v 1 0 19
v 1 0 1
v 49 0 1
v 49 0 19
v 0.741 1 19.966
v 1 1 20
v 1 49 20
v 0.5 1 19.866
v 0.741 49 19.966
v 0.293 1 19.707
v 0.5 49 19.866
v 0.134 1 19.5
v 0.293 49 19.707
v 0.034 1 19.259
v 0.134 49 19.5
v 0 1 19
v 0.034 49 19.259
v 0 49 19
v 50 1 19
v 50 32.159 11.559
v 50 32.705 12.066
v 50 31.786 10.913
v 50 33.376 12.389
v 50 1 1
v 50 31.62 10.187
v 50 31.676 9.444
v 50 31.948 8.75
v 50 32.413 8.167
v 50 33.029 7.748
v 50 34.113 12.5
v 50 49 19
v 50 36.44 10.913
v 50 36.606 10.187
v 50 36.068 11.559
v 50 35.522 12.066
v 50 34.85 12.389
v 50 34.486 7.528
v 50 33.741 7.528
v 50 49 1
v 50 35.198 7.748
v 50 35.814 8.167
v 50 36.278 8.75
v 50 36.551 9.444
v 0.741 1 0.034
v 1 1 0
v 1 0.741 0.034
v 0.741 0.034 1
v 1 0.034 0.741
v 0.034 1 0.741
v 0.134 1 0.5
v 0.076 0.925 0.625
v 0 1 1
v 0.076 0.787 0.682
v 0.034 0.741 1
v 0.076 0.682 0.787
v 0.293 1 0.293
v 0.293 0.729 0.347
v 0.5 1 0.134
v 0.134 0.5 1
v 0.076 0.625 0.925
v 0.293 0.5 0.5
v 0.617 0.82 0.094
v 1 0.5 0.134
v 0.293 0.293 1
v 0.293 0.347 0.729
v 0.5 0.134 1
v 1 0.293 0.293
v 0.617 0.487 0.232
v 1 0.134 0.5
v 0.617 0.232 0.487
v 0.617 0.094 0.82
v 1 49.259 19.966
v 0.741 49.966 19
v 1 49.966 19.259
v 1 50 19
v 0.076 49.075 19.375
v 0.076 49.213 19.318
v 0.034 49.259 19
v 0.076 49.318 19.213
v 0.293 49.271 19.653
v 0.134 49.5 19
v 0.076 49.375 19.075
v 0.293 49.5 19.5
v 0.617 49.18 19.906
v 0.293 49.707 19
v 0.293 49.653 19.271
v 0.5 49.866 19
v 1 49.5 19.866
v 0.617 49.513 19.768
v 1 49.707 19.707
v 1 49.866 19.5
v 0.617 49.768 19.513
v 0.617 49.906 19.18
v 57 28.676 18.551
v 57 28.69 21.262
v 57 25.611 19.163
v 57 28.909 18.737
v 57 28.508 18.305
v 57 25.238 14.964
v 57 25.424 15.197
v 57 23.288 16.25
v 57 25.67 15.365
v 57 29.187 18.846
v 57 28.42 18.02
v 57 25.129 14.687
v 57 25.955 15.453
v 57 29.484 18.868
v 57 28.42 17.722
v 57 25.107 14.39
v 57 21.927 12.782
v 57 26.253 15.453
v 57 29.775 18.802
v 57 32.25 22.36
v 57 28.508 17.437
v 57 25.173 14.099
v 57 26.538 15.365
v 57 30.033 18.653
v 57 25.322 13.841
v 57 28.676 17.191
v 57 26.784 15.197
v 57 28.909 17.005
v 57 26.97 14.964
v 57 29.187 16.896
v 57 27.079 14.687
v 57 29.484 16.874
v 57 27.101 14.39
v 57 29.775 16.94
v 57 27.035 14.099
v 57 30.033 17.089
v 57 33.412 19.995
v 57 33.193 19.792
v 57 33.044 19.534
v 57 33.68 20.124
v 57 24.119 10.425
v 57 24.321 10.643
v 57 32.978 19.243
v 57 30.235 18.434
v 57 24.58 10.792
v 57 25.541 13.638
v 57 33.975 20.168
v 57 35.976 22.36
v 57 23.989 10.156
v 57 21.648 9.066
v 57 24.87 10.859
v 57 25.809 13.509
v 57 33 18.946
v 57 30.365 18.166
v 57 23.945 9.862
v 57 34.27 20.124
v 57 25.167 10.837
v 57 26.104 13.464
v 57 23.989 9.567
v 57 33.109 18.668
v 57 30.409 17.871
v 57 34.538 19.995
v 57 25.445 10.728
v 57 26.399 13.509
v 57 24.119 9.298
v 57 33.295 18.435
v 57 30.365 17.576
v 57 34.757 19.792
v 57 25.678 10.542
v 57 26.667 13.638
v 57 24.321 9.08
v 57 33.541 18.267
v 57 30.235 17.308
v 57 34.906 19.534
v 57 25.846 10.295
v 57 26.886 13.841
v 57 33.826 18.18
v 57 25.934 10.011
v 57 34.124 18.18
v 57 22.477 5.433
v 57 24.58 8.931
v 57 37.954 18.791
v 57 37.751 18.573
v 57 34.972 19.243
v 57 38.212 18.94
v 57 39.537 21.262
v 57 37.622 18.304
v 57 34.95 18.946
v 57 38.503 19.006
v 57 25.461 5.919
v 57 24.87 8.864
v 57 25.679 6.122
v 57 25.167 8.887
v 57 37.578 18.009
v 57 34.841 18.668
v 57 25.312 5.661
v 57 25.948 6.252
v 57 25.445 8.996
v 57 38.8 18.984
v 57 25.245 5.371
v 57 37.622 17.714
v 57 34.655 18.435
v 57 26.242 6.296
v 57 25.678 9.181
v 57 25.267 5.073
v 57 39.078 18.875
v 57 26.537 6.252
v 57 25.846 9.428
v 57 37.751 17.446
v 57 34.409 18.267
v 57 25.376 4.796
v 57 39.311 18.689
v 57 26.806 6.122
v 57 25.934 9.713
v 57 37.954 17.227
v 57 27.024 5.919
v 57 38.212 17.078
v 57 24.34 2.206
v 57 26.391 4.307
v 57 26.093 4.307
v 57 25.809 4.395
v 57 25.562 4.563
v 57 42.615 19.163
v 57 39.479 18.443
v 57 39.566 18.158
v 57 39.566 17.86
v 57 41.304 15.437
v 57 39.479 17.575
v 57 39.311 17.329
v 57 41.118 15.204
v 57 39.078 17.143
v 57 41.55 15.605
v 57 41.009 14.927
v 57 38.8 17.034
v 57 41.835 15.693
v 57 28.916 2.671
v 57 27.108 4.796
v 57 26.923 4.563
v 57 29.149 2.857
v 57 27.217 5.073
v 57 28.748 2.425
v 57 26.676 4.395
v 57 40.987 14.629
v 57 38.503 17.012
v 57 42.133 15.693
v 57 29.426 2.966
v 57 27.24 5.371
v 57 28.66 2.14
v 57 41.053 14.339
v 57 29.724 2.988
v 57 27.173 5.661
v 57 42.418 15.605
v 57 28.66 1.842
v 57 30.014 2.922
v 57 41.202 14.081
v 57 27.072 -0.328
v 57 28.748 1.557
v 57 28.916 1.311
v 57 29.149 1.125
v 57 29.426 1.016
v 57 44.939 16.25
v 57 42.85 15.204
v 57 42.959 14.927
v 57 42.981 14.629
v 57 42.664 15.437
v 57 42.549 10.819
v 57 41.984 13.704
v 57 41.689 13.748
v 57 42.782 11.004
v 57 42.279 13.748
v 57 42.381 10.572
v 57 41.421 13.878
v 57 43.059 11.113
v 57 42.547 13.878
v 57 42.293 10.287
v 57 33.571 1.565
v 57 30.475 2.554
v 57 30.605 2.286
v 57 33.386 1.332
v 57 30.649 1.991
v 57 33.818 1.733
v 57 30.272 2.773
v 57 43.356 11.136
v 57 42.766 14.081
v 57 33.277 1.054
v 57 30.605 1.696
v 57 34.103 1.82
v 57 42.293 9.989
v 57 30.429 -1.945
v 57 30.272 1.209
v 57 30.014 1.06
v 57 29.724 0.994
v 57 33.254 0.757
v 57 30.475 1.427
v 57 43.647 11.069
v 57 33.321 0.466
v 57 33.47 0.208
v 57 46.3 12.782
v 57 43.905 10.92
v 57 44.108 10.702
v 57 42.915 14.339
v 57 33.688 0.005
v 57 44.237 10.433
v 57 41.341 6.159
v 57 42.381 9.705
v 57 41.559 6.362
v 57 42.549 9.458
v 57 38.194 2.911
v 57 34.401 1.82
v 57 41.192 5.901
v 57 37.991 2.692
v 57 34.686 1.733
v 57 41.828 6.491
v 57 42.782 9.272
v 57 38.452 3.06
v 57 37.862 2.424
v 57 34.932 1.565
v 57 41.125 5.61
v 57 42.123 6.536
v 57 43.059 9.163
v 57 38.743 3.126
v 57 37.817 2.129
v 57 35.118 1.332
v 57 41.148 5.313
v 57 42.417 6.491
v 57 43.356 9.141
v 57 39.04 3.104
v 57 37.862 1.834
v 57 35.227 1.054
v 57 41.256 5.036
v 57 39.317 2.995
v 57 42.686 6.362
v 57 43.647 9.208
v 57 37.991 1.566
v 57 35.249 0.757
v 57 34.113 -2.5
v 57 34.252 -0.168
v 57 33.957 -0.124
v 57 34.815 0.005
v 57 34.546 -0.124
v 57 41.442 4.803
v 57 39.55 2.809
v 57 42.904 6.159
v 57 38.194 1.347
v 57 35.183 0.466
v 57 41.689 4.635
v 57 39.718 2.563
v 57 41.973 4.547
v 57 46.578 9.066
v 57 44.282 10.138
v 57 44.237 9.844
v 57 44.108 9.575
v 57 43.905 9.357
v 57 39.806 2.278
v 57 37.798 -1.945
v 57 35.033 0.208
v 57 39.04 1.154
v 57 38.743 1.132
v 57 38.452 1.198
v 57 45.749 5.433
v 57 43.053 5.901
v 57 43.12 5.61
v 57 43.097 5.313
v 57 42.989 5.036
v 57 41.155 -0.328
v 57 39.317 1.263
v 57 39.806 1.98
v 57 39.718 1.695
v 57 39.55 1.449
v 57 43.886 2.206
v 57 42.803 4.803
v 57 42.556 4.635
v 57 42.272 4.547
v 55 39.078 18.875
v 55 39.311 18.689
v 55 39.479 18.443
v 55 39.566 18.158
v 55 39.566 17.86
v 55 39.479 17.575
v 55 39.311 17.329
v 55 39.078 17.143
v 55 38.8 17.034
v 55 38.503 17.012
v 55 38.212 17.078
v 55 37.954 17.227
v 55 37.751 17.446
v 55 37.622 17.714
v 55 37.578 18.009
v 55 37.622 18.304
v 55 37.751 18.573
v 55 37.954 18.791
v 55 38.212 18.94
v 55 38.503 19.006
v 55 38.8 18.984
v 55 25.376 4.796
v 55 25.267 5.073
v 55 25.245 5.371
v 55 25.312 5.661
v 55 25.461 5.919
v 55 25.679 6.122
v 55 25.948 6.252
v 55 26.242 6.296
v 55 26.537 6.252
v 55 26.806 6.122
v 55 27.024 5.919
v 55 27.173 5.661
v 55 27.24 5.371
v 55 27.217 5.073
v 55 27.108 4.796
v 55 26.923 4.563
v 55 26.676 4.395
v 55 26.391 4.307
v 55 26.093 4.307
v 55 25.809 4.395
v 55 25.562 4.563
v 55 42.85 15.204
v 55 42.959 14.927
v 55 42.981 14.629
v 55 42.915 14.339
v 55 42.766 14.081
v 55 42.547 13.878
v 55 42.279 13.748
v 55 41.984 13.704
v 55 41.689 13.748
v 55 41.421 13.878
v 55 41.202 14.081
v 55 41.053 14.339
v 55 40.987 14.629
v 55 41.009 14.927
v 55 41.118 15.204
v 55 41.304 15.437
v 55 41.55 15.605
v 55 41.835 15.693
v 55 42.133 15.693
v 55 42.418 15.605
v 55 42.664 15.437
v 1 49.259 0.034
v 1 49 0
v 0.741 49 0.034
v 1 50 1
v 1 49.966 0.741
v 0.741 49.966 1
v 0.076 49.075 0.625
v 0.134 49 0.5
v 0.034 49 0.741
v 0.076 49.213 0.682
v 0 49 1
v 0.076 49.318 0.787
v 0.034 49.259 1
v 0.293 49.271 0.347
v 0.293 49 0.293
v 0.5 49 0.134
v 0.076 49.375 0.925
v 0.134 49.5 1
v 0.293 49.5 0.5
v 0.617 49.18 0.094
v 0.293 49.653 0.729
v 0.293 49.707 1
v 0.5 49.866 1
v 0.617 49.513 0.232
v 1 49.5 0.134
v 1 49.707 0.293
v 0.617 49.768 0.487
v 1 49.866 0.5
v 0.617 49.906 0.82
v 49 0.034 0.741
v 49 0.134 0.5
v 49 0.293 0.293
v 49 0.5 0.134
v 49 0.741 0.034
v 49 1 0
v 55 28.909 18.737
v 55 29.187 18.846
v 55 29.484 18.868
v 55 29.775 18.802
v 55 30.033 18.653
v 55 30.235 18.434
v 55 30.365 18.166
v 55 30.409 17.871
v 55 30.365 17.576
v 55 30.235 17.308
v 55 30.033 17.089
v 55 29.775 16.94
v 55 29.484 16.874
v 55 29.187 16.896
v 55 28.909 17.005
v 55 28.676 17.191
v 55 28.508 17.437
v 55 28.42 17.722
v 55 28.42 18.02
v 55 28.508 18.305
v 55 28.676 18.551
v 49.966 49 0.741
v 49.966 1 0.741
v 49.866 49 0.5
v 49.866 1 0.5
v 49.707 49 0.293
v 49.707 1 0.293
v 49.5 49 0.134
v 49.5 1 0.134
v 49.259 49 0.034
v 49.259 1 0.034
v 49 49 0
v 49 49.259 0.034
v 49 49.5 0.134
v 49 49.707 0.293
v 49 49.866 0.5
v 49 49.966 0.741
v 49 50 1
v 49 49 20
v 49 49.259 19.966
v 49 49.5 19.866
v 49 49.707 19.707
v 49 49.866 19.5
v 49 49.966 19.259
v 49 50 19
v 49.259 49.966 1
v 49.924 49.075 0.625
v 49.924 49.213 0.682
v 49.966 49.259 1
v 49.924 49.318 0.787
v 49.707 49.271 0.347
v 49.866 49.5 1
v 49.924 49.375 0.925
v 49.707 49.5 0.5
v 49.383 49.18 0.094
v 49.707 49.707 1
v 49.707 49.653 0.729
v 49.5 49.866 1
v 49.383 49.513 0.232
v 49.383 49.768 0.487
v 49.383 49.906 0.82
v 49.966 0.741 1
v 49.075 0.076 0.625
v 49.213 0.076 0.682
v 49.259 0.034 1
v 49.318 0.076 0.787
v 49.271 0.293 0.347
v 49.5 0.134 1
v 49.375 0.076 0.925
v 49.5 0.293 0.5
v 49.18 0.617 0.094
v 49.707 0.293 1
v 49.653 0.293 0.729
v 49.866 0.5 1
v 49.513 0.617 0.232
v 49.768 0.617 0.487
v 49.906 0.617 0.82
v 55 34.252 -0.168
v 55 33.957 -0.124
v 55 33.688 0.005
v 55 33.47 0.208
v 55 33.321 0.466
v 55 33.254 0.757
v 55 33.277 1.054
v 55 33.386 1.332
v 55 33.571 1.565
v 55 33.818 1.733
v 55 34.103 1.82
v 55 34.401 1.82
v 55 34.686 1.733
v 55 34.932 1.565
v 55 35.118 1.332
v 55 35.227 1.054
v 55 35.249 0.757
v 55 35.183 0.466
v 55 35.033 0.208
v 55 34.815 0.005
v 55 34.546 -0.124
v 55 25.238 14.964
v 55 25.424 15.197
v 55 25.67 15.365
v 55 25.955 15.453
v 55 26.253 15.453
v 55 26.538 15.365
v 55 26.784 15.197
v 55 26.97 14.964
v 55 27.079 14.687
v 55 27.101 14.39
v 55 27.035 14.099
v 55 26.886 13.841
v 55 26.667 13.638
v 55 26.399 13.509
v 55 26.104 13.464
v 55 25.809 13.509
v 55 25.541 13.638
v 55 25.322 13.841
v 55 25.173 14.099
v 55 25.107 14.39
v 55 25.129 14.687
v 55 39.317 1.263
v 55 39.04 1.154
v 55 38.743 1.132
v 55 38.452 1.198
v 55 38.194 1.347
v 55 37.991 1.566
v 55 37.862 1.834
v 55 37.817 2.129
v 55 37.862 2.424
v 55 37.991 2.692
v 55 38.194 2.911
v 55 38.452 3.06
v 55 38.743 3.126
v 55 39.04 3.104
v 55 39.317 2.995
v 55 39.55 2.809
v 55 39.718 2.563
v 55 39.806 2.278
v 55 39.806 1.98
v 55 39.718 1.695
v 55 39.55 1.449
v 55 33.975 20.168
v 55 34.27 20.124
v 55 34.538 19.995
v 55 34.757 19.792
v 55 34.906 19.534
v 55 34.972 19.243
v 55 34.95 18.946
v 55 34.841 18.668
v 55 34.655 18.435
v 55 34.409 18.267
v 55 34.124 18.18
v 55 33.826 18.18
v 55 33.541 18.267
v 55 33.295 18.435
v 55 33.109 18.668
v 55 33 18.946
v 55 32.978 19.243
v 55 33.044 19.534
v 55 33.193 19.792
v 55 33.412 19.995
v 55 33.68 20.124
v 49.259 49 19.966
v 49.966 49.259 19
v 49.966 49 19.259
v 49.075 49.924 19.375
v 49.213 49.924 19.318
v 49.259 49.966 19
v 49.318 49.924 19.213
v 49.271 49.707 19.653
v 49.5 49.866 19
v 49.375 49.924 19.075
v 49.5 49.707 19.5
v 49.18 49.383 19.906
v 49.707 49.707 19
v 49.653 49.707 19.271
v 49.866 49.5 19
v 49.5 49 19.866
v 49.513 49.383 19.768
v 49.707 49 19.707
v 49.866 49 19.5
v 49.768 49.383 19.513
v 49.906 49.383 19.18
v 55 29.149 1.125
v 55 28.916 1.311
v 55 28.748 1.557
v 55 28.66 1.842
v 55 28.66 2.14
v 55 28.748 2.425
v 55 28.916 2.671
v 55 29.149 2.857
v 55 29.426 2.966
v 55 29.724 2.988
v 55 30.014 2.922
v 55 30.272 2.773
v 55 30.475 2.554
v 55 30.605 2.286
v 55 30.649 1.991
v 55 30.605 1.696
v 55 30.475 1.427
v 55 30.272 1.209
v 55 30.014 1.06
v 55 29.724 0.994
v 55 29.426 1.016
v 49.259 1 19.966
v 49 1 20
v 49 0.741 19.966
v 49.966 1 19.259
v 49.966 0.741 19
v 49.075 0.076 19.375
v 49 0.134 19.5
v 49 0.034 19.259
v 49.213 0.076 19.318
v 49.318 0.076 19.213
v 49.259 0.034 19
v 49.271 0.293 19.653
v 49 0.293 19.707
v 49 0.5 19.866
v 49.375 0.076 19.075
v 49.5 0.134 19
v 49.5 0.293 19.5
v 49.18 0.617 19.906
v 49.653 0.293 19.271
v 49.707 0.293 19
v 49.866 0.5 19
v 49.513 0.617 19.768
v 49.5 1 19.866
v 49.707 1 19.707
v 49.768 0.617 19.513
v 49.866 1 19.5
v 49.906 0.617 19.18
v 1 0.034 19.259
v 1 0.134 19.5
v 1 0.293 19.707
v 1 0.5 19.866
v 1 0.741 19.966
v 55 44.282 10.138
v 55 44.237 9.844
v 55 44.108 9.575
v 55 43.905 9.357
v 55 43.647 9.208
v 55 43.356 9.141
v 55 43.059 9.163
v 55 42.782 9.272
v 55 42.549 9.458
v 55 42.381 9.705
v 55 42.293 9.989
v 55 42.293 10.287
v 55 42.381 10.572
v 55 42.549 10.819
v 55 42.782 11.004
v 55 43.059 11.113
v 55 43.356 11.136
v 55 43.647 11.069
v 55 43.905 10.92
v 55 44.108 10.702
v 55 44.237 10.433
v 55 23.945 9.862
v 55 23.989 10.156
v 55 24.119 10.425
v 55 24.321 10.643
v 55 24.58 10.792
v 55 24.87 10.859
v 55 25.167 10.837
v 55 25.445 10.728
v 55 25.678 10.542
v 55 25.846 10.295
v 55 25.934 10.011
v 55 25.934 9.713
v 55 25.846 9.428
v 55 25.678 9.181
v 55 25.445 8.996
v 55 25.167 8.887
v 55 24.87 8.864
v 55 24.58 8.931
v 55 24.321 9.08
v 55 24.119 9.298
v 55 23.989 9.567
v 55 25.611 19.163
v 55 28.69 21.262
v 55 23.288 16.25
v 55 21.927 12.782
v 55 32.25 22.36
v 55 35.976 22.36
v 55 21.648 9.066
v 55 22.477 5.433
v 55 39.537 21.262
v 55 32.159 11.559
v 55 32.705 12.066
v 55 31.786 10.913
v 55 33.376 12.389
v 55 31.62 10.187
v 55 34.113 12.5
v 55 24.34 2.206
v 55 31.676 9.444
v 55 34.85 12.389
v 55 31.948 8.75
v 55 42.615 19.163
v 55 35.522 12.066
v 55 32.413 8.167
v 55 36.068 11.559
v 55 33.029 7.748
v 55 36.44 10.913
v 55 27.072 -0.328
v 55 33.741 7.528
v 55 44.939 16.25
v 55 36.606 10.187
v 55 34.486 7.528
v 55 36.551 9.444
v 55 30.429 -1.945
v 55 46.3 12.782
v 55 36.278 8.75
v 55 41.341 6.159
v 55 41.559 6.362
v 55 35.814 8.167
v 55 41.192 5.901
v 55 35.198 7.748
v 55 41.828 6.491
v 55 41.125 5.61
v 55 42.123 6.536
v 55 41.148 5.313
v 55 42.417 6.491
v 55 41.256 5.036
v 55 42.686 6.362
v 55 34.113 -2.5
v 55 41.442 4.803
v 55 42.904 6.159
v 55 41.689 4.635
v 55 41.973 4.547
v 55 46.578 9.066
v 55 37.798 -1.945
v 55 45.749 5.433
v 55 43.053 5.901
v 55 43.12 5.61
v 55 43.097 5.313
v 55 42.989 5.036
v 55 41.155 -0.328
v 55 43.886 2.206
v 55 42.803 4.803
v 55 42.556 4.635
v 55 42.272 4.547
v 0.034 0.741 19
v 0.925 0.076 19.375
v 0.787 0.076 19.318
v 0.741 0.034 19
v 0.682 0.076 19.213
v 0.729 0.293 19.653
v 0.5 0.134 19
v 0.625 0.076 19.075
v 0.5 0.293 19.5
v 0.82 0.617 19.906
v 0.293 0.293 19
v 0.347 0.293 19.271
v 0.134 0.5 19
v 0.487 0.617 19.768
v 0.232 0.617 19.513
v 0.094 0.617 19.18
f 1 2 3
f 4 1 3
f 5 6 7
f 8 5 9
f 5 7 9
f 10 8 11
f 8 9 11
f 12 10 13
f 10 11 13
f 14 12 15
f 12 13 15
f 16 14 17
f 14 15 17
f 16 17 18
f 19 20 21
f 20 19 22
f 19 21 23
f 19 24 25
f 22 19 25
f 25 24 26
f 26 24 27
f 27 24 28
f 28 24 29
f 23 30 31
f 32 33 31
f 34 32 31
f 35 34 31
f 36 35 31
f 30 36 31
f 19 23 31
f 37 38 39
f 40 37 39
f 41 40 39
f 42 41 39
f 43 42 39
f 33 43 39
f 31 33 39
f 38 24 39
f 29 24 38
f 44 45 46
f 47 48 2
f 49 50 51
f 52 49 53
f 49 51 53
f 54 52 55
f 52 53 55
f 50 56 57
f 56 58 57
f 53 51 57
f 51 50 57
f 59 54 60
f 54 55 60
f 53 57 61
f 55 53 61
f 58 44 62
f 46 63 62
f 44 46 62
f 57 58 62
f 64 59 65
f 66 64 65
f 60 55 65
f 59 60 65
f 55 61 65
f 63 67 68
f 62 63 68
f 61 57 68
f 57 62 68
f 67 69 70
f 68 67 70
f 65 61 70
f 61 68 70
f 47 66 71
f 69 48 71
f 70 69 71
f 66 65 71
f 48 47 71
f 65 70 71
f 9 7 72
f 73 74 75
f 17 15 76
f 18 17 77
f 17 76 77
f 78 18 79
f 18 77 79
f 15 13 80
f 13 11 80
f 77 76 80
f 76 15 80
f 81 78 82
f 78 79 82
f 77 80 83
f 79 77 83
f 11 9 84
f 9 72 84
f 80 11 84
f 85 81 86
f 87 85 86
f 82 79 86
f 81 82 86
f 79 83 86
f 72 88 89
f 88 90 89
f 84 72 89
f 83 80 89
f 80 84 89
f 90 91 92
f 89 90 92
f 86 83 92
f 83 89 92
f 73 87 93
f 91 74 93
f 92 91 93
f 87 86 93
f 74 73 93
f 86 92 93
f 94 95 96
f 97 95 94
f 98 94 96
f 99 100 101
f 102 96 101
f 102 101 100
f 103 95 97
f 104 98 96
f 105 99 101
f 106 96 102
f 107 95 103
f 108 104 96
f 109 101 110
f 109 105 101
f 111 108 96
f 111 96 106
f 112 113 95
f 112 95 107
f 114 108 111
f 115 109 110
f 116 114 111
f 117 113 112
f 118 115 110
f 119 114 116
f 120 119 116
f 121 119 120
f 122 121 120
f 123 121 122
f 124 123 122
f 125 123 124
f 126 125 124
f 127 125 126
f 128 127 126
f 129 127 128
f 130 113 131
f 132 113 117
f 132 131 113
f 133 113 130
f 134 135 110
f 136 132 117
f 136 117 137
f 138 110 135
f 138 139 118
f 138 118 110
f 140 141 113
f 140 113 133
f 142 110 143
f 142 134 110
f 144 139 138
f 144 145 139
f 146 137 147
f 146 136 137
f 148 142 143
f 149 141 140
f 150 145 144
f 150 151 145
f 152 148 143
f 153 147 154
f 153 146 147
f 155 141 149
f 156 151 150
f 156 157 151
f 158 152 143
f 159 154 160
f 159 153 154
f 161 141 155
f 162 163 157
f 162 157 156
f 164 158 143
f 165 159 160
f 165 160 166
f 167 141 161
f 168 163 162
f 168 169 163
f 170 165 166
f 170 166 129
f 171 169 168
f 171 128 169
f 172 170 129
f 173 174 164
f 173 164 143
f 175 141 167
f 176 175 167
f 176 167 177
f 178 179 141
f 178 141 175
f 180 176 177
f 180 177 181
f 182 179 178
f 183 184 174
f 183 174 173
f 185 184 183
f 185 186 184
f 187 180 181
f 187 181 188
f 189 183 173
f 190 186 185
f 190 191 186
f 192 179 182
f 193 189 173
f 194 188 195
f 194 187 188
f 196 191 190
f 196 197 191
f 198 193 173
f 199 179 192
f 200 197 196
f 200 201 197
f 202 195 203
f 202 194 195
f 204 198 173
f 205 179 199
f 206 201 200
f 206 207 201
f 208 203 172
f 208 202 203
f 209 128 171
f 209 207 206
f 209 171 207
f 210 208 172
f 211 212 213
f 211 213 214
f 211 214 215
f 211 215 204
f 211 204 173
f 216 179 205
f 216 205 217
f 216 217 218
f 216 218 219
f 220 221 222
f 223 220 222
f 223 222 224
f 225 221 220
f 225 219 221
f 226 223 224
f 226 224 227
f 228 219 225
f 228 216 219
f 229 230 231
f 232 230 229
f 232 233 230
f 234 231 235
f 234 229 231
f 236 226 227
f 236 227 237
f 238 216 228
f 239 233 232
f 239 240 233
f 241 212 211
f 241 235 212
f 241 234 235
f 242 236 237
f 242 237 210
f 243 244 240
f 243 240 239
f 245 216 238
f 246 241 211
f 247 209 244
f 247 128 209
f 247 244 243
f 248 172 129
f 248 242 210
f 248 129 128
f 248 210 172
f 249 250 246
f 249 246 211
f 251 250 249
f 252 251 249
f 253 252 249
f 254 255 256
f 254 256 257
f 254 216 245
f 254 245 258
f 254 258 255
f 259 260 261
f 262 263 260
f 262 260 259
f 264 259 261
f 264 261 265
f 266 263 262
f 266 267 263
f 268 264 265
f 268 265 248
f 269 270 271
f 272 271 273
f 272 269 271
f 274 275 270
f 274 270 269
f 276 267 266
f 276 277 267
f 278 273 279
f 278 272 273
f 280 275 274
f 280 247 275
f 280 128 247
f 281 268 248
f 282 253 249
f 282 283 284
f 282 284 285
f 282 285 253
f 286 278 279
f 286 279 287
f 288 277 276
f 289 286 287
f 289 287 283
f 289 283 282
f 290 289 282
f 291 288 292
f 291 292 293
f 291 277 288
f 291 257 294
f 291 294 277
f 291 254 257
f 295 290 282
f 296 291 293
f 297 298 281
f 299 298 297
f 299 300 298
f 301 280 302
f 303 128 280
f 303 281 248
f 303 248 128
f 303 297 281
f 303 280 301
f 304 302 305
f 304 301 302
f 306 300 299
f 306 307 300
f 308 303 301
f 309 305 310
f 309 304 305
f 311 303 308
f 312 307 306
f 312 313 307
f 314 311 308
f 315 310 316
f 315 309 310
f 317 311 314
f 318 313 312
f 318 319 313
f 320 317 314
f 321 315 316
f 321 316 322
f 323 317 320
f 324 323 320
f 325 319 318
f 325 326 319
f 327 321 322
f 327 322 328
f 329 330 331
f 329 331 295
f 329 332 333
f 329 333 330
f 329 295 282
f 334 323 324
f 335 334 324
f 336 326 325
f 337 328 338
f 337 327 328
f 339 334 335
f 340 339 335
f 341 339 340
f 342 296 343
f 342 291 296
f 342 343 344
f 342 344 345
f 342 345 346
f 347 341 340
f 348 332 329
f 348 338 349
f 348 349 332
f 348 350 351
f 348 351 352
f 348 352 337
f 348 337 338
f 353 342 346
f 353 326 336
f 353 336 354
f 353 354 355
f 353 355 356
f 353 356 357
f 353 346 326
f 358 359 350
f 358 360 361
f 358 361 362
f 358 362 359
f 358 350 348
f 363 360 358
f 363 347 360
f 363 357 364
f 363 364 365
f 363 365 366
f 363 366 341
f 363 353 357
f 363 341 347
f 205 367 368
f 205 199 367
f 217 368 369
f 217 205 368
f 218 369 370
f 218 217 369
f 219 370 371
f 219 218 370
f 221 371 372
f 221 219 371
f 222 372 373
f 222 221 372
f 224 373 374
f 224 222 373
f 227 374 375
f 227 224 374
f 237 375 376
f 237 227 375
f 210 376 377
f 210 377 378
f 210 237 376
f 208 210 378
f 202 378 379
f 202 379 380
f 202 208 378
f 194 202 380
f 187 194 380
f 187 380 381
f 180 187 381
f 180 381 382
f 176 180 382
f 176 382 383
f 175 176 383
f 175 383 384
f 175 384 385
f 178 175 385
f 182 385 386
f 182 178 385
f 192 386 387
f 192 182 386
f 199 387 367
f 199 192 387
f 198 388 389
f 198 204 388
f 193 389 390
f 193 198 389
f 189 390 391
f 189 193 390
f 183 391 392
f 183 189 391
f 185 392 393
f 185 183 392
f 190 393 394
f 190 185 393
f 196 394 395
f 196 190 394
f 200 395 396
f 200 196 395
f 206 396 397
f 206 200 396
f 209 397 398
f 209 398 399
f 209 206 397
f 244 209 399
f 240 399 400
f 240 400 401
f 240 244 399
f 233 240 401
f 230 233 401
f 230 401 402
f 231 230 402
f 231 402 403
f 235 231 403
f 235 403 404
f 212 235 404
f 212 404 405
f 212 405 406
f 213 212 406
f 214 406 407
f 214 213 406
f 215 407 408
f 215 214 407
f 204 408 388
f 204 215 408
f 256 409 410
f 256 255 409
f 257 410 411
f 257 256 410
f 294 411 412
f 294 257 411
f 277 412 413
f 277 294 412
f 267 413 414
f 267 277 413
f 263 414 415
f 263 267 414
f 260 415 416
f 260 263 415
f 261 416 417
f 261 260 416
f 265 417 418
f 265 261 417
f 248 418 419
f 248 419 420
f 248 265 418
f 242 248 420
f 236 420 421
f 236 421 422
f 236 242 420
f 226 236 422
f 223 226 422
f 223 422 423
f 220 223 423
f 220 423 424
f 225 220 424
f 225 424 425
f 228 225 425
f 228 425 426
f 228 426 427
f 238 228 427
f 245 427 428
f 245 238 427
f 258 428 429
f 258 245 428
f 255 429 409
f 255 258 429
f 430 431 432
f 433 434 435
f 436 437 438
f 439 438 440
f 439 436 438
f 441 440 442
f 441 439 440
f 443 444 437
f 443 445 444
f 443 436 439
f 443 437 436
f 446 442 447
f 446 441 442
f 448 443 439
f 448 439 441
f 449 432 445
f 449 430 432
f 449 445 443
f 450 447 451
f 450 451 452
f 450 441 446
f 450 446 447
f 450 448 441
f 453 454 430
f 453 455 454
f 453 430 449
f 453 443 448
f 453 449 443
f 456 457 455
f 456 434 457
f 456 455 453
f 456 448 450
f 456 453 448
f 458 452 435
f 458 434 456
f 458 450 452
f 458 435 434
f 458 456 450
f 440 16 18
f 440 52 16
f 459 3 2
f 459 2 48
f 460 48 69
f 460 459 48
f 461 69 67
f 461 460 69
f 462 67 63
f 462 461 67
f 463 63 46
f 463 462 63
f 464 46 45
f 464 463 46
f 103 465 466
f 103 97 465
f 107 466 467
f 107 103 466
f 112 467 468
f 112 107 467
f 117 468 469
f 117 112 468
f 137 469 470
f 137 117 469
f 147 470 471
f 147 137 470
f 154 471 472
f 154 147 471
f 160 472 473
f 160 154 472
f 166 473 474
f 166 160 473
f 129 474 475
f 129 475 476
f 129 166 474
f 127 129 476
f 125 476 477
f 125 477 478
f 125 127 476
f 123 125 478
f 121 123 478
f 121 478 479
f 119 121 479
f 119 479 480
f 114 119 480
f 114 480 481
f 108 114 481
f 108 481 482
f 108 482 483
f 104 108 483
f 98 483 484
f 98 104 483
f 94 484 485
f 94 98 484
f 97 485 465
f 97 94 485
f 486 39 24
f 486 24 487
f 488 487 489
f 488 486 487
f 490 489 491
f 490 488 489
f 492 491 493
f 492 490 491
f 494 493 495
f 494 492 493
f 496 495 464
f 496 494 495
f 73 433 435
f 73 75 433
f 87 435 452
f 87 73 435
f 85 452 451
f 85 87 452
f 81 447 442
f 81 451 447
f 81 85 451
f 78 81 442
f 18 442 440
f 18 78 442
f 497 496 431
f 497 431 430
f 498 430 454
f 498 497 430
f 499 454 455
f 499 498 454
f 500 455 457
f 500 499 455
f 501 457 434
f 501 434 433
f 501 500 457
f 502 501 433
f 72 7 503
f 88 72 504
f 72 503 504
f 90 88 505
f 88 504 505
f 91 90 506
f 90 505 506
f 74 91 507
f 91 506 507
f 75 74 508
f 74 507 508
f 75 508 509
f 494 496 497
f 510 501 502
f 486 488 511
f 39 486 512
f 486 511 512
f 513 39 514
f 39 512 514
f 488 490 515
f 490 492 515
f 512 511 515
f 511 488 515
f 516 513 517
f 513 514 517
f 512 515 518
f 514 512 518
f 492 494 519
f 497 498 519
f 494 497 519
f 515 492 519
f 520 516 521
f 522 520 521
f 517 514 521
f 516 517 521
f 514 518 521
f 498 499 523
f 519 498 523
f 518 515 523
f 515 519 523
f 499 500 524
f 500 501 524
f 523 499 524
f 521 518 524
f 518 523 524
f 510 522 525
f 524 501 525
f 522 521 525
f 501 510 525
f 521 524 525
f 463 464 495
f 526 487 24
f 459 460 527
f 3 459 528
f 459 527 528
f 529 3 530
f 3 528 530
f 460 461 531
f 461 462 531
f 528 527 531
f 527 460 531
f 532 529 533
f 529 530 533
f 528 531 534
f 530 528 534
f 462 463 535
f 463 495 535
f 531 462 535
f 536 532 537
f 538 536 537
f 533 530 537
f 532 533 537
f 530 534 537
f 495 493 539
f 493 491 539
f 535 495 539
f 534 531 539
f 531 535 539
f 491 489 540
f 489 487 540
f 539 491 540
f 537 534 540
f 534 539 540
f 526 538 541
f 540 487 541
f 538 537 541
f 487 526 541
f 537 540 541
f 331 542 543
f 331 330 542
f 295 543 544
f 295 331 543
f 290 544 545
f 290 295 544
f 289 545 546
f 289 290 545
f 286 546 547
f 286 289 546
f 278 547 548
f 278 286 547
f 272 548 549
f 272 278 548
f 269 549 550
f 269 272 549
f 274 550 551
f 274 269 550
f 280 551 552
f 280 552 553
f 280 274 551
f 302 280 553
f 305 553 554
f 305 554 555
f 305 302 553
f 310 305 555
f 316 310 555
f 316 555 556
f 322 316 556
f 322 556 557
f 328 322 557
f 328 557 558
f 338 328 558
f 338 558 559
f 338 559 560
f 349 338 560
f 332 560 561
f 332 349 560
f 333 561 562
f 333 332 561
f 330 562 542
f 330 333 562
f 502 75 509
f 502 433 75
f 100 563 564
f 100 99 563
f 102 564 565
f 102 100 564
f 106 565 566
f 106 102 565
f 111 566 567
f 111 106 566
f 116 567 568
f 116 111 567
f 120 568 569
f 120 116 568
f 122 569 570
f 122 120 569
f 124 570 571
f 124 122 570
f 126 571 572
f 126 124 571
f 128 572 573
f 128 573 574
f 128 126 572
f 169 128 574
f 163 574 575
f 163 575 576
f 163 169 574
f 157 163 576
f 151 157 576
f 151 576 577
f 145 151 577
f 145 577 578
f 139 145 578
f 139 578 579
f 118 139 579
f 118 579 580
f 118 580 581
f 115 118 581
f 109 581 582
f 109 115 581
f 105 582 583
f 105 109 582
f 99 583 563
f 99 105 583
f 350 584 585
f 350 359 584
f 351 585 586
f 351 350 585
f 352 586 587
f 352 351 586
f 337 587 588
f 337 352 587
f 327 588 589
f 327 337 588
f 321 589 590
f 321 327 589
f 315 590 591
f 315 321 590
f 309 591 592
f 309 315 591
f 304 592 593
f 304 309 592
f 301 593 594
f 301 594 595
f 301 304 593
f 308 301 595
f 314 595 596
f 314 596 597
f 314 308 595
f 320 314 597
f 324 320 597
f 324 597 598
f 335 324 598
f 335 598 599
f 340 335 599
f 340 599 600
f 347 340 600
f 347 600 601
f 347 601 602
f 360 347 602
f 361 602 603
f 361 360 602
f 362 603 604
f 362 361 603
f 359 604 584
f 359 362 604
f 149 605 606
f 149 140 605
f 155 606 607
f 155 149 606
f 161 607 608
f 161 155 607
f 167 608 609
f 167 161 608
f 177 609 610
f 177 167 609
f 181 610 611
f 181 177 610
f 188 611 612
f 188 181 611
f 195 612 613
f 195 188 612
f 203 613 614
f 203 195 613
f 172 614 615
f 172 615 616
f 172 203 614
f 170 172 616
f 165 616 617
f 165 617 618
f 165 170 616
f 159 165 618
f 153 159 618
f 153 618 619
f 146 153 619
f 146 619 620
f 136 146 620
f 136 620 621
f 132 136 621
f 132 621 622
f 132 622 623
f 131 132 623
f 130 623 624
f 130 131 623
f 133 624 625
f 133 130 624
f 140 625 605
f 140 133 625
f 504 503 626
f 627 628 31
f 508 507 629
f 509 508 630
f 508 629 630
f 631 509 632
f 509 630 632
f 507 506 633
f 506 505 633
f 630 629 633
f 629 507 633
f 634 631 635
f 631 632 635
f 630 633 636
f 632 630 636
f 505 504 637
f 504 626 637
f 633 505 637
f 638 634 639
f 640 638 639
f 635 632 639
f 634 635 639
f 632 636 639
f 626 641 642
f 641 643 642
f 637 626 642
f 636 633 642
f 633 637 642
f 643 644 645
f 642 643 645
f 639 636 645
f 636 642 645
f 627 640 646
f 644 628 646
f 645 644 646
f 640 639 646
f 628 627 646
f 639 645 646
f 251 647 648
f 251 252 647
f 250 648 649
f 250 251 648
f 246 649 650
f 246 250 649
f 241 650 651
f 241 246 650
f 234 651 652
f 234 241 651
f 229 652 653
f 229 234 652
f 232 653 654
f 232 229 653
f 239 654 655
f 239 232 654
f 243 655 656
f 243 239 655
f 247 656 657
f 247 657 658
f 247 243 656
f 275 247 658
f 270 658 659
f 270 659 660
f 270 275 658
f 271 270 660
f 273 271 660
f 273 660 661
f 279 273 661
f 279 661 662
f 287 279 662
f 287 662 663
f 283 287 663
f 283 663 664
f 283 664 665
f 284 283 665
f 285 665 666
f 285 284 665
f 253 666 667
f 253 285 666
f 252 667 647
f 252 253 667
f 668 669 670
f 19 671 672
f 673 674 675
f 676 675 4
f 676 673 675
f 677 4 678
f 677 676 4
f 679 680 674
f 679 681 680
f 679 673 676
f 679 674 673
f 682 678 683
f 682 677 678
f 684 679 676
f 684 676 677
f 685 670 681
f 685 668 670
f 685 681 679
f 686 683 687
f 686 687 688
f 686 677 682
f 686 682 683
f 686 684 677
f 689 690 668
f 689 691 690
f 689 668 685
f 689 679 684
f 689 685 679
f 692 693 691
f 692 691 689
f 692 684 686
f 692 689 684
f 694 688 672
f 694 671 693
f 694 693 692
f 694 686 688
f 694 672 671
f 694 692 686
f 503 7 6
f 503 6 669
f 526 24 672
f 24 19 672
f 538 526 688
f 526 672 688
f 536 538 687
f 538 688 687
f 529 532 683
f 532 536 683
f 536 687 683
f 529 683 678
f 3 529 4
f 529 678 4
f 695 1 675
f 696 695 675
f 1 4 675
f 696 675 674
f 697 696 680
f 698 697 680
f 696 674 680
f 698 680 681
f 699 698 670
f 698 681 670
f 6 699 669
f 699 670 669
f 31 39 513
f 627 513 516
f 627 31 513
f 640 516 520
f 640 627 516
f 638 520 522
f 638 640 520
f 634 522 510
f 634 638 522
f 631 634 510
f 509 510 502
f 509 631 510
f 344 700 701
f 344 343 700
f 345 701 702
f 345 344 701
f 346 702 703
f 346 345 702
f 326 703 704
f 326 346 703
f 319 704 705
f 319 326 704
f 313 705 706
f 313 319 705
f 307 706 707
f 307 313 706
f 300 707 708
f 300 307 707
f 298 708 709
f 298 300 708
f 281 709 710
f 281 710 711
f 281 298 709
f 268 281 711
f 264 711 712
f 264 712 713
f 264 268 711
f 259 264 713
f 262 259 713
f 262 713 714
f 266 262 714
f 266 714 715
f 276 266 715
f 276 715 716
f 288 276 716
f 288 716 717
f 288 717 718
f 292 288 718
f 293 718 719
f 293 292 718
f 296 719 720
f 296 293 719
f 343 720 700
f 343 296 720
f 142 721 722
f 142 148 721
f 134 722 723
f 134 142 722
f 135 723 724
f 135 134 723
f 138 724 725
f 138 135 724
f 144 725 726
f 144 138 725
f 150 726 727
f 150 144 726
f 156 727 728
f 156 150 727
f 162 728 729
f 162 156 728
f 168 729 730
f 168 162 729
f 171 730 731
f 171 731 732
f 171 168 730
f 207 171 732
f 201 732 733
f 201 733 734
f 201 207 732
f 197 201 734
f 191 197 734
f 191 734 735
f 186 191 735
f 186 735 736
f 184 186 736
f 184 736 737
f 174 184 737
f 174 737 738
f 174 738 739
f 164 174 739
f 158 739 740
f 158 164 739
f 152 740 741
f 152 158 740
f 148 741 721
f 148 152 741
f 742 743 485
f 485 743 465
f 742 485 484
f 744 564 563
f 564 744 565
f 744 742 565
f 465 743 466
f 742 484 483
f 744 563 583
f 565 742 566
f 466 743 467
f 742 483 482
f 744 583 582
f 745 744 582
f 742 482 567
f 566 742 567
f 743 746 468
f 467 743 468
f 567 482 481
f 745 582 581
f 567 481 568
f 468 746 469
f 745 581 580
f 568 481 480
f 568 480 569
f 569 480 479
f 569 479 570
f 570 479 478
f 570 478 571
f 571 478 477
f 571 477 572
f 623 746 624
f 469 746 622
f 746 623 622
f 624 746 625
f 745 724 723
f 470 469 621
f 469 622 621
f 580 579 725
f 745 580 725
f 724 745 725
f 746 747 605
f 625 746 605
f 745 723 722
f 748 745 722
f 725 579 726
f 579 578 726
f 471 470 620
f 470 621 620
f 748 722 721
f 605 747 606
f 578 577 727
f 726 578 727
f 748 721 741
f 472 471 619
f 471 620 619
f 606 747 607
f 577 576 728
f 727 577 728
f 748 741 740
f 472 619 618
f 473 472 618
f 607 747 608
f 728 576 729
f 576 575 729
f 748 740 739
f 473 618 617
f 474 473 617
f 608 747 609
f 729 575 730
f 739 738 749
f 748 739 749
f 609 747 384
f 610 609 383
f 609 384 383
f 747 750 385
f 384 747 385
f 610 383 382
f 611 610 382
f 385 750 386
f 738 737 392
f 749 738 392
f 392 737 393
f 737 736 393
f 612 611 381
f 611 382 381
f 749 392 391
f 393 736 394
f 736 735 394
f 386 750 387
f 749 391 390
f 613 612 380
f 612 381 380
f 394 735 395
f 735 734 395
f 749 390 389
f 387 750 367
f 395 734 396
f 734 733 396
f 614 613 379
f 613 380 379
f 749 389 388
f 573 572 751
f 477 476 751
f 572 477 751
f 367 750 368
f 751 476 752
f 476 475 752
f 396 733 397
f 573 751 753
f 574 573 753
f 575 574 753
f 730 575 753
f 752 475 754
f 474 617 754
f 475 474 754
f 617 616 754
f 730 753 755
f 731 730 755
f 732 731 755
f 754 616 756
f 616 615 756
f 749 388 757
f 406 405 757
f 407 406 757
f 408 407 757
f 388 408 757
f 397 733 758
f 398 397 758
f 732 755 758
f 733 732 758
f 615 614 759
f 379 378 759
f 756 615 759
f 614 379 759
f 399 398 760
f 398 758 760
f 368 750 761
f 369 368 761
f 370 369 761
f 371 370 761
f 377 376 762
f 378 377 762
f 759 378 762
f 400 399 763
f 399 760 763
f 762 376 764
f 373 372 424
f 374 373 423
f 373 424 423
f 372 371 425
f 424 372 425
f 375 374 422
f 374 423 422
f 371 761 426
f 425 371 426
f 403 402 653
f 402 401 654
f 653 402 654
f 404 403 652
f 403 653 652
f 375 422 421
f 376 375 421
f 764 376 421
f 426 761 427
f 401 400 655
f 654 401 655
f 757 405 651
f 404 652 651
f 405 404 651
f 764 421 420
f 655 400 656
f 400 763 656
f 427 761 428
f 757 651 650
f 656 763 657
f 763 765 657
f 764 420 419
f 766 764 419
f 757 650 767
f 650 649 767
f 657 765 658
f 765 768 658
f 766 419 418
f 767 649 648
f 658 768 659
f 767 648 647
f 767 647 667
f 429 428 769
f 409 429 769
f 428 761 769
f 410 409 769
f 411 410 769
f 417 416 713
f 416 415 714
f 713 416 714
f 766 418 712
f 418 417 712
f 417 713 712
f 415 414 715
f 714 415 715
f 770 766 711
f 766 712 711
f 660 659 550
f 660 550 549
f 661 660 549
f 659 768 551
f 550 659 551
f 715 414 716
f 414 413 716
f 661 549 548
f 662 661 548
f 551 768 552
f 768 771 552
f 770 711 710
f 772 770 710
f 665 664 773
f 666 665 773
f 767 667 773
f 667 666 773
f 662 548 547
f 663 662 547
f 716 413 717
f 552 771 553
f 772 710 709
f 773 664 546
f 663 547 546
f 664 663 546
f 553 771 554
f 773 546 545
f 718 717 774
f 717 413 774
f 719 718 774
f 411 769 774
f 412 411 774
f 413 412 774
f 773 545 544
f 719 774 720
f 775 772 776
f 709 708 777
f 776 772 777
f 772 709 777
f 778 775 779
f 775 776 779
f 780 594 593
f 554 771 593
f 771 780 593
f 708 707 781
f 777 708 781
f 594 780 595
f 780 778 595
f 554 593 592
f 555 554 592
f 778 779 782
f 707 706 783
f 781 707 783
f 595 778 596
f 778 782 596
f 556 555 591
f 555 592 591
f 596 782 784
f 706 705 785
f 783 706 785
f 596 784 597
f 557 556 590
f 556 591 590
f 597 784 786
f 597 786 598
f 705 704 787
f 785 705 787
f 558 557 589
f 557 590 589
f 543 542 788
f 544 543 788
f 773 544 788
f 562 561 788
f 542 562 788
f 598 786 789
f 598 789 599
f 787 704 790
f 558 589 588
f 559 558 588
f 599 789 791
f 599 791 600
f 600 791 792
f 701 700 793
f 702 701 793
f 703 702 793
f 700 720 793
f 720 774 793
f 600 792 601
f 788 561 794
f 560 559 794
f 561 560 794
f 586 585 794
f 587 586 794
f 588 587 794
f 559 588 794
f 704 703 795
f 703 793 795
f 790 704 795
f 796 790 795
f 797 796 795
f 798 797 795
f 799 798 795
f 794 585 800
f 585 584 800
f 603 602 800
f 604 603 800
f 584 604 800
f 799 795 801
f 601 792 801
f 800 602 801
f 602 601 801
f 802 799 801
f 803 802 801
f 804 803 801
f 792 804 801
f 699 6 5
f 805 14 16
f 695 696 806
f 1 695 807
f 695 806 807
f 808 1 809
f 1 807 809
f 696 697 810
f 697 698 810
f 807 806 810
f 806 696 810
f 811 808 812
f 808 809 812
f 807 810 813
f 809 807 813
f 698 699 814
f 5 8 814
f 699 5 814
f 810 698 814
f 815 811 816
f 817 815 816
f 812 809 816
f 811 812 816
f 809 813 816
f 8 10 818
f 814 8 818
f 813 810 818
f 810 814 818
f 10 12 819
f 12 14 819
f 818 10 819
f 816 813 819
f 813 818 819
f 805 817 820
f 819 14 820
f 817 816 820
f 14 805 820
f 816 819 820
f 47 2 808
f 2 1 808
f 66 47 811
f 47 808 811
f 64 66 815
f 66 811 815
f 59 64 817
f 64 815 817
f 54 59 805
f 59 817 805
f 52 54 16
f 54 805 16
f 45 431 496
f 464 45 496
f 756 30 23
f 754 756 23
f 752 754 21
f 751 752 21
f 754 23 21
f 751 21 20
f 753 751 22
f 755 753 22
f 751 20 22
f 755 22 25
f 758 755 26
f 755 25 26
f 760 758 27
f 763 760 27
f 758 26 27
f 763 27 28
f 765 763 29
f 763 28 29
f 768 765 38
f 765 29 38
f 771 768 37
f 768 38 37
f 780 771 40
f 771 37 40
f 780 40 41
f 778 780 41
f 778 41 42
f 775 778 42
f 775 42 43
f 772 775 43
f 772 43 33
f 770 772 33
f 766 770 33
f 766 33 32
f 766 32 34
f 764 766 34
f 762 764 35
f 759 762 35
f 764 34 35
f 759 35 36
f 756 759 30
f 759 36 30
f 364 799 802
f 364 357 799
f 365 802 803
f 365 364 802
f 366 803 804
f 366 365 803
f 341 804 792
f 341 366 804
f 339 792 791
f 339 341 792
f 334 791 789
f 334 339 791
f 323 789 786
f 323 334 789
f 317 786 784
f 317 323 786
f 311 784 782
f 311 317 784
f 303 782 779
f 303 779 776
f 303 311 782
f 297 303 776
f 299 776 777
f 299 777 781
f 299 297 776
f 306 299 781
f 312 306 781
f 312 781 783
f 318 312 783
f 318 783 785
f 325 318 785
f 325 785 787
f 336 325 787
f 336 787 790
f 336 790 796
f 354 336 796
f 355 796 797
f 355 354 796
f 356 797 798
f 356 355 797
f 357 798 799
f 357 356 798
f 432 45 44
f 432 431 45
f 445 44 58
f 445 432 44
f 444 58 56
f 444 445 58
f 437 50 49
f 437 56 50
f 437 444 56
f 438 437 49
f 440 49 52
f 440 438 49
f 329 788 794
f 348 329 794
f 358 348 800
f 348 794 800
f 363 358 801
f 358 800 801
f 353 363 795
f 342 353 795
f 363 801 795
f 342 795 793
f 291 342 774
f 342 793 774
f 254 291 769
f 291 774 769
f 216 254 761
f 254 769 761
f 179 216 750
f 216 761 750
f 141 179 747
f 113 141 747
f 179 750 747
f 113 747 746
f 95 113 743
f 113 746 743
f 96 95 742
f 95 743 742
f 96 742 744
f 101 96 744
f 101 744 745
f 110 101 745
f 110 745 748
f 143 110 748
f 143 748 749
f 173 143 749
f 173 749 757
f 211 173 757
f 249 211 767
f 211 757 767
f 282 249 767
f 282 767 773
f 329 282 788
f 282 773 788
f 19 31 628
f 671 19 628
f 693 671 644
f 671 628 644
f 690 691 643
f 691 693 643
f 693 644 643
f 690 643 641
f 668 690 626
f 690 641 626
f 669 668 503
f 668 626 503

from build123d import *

# Parameters (mm, degrees)
SKETCH1_W           = 50
SKETCH1_H           = 50
BOSS_EXTRUDE1_DEPTH = 20
SKETCH2_R           = 2.5
BOSS_EXTRUDE2_DEPTH = 5
SKETCH3_R           = 12.5
BOSS_EXTRUDE3_DEPTH = 2
FILLET1_R           = 1
CIRPATTERN1_COUNT   = 12


with BuildPart() as part:
    # Sketch1 → Boss-Extrude1 (new body)
    with BuildSketch(Plane.XY):
        with Locations((25, 25)):
            Rectangle(SKETCH1_W, SKETCH1_H)
    extrude(amount=BOSS_EXTRUDE1_DEPTH)

    # Sketch2 → Boss-Extrude2 (add)
    with BuildSketch(Plane(origin=(50, 0, 0), x_dir=(0, 0, -1), z_dir=(1, 0, 0))):
        with Locations(Location((-10, 34.113262312, 0), (0, 0, 180))):
            Circle(SKETCH2_R)
    extrude(amount=BOSS_EXTRUDE2_DEPTH)

    # Sketch3 → Boss-Extrude3 (add)
    with BuildSketch(Plane(origin=(55, 0, 0), x_dir=(0, 0, -1), z_dir=(1, 0, 0))):
        with Locations((-10, 34.113262312)):
            Circle(SKETCH3_R)
    extrude(amount=BOSS_EXTRUDE3_DEPTH)

    # Fillet1
    fillet1_edges = [part.edges().sort_by_distance(p)[0] for p in [
        (50, 25, 20),
        (25, 50, 20),
        (0, 25, 20),
        (25, 50, 0),
        (50, 25, 0),
        (25, 0, 0),
        (0, 25, 0),
        (25, 0, 20),
        (0, 50, 10),
        (50, 50, 10),
        (50, 0, 10),
        (0, 0, 10),
    ]]
    fillet(fillet1_edges, radius=FILLET1_R)

    # Sketch4 → Ø2.0mm Dowel Hole1 (revolve, cut)
    with BuildSketch(Plane(origin=(57, 34.25166224, 0.83161613), x_dir=(0, 0, -1), z_dir=(0, 1, 0))):
        Polygon((0, 0), (0, 2.600860619), (1, 2), (1, 0), align=None)
    f_2_0mm_dowel_hole1 = revolve(axis=Axis((63.35, 34.25166224, 0.83161613), (-1, 0, 0)), mode=Mode.SUBTRACT)

    # CirPattern1: Ø2.0mm Dowel Hole1 ×12 about axis
    cirpattern1_axis = Axis((0, 34.113262312, 10), (1, 0, 0))
    for i in range(1, CIRPATTERN1_COUNT):
        add(f_2_0mm_dowel_hole1.rotate(cirpattern1_axis, i * 360 / CIRPATTERN1_COUNT), mode=Mode.SUBTRACT)


solid = part.part
